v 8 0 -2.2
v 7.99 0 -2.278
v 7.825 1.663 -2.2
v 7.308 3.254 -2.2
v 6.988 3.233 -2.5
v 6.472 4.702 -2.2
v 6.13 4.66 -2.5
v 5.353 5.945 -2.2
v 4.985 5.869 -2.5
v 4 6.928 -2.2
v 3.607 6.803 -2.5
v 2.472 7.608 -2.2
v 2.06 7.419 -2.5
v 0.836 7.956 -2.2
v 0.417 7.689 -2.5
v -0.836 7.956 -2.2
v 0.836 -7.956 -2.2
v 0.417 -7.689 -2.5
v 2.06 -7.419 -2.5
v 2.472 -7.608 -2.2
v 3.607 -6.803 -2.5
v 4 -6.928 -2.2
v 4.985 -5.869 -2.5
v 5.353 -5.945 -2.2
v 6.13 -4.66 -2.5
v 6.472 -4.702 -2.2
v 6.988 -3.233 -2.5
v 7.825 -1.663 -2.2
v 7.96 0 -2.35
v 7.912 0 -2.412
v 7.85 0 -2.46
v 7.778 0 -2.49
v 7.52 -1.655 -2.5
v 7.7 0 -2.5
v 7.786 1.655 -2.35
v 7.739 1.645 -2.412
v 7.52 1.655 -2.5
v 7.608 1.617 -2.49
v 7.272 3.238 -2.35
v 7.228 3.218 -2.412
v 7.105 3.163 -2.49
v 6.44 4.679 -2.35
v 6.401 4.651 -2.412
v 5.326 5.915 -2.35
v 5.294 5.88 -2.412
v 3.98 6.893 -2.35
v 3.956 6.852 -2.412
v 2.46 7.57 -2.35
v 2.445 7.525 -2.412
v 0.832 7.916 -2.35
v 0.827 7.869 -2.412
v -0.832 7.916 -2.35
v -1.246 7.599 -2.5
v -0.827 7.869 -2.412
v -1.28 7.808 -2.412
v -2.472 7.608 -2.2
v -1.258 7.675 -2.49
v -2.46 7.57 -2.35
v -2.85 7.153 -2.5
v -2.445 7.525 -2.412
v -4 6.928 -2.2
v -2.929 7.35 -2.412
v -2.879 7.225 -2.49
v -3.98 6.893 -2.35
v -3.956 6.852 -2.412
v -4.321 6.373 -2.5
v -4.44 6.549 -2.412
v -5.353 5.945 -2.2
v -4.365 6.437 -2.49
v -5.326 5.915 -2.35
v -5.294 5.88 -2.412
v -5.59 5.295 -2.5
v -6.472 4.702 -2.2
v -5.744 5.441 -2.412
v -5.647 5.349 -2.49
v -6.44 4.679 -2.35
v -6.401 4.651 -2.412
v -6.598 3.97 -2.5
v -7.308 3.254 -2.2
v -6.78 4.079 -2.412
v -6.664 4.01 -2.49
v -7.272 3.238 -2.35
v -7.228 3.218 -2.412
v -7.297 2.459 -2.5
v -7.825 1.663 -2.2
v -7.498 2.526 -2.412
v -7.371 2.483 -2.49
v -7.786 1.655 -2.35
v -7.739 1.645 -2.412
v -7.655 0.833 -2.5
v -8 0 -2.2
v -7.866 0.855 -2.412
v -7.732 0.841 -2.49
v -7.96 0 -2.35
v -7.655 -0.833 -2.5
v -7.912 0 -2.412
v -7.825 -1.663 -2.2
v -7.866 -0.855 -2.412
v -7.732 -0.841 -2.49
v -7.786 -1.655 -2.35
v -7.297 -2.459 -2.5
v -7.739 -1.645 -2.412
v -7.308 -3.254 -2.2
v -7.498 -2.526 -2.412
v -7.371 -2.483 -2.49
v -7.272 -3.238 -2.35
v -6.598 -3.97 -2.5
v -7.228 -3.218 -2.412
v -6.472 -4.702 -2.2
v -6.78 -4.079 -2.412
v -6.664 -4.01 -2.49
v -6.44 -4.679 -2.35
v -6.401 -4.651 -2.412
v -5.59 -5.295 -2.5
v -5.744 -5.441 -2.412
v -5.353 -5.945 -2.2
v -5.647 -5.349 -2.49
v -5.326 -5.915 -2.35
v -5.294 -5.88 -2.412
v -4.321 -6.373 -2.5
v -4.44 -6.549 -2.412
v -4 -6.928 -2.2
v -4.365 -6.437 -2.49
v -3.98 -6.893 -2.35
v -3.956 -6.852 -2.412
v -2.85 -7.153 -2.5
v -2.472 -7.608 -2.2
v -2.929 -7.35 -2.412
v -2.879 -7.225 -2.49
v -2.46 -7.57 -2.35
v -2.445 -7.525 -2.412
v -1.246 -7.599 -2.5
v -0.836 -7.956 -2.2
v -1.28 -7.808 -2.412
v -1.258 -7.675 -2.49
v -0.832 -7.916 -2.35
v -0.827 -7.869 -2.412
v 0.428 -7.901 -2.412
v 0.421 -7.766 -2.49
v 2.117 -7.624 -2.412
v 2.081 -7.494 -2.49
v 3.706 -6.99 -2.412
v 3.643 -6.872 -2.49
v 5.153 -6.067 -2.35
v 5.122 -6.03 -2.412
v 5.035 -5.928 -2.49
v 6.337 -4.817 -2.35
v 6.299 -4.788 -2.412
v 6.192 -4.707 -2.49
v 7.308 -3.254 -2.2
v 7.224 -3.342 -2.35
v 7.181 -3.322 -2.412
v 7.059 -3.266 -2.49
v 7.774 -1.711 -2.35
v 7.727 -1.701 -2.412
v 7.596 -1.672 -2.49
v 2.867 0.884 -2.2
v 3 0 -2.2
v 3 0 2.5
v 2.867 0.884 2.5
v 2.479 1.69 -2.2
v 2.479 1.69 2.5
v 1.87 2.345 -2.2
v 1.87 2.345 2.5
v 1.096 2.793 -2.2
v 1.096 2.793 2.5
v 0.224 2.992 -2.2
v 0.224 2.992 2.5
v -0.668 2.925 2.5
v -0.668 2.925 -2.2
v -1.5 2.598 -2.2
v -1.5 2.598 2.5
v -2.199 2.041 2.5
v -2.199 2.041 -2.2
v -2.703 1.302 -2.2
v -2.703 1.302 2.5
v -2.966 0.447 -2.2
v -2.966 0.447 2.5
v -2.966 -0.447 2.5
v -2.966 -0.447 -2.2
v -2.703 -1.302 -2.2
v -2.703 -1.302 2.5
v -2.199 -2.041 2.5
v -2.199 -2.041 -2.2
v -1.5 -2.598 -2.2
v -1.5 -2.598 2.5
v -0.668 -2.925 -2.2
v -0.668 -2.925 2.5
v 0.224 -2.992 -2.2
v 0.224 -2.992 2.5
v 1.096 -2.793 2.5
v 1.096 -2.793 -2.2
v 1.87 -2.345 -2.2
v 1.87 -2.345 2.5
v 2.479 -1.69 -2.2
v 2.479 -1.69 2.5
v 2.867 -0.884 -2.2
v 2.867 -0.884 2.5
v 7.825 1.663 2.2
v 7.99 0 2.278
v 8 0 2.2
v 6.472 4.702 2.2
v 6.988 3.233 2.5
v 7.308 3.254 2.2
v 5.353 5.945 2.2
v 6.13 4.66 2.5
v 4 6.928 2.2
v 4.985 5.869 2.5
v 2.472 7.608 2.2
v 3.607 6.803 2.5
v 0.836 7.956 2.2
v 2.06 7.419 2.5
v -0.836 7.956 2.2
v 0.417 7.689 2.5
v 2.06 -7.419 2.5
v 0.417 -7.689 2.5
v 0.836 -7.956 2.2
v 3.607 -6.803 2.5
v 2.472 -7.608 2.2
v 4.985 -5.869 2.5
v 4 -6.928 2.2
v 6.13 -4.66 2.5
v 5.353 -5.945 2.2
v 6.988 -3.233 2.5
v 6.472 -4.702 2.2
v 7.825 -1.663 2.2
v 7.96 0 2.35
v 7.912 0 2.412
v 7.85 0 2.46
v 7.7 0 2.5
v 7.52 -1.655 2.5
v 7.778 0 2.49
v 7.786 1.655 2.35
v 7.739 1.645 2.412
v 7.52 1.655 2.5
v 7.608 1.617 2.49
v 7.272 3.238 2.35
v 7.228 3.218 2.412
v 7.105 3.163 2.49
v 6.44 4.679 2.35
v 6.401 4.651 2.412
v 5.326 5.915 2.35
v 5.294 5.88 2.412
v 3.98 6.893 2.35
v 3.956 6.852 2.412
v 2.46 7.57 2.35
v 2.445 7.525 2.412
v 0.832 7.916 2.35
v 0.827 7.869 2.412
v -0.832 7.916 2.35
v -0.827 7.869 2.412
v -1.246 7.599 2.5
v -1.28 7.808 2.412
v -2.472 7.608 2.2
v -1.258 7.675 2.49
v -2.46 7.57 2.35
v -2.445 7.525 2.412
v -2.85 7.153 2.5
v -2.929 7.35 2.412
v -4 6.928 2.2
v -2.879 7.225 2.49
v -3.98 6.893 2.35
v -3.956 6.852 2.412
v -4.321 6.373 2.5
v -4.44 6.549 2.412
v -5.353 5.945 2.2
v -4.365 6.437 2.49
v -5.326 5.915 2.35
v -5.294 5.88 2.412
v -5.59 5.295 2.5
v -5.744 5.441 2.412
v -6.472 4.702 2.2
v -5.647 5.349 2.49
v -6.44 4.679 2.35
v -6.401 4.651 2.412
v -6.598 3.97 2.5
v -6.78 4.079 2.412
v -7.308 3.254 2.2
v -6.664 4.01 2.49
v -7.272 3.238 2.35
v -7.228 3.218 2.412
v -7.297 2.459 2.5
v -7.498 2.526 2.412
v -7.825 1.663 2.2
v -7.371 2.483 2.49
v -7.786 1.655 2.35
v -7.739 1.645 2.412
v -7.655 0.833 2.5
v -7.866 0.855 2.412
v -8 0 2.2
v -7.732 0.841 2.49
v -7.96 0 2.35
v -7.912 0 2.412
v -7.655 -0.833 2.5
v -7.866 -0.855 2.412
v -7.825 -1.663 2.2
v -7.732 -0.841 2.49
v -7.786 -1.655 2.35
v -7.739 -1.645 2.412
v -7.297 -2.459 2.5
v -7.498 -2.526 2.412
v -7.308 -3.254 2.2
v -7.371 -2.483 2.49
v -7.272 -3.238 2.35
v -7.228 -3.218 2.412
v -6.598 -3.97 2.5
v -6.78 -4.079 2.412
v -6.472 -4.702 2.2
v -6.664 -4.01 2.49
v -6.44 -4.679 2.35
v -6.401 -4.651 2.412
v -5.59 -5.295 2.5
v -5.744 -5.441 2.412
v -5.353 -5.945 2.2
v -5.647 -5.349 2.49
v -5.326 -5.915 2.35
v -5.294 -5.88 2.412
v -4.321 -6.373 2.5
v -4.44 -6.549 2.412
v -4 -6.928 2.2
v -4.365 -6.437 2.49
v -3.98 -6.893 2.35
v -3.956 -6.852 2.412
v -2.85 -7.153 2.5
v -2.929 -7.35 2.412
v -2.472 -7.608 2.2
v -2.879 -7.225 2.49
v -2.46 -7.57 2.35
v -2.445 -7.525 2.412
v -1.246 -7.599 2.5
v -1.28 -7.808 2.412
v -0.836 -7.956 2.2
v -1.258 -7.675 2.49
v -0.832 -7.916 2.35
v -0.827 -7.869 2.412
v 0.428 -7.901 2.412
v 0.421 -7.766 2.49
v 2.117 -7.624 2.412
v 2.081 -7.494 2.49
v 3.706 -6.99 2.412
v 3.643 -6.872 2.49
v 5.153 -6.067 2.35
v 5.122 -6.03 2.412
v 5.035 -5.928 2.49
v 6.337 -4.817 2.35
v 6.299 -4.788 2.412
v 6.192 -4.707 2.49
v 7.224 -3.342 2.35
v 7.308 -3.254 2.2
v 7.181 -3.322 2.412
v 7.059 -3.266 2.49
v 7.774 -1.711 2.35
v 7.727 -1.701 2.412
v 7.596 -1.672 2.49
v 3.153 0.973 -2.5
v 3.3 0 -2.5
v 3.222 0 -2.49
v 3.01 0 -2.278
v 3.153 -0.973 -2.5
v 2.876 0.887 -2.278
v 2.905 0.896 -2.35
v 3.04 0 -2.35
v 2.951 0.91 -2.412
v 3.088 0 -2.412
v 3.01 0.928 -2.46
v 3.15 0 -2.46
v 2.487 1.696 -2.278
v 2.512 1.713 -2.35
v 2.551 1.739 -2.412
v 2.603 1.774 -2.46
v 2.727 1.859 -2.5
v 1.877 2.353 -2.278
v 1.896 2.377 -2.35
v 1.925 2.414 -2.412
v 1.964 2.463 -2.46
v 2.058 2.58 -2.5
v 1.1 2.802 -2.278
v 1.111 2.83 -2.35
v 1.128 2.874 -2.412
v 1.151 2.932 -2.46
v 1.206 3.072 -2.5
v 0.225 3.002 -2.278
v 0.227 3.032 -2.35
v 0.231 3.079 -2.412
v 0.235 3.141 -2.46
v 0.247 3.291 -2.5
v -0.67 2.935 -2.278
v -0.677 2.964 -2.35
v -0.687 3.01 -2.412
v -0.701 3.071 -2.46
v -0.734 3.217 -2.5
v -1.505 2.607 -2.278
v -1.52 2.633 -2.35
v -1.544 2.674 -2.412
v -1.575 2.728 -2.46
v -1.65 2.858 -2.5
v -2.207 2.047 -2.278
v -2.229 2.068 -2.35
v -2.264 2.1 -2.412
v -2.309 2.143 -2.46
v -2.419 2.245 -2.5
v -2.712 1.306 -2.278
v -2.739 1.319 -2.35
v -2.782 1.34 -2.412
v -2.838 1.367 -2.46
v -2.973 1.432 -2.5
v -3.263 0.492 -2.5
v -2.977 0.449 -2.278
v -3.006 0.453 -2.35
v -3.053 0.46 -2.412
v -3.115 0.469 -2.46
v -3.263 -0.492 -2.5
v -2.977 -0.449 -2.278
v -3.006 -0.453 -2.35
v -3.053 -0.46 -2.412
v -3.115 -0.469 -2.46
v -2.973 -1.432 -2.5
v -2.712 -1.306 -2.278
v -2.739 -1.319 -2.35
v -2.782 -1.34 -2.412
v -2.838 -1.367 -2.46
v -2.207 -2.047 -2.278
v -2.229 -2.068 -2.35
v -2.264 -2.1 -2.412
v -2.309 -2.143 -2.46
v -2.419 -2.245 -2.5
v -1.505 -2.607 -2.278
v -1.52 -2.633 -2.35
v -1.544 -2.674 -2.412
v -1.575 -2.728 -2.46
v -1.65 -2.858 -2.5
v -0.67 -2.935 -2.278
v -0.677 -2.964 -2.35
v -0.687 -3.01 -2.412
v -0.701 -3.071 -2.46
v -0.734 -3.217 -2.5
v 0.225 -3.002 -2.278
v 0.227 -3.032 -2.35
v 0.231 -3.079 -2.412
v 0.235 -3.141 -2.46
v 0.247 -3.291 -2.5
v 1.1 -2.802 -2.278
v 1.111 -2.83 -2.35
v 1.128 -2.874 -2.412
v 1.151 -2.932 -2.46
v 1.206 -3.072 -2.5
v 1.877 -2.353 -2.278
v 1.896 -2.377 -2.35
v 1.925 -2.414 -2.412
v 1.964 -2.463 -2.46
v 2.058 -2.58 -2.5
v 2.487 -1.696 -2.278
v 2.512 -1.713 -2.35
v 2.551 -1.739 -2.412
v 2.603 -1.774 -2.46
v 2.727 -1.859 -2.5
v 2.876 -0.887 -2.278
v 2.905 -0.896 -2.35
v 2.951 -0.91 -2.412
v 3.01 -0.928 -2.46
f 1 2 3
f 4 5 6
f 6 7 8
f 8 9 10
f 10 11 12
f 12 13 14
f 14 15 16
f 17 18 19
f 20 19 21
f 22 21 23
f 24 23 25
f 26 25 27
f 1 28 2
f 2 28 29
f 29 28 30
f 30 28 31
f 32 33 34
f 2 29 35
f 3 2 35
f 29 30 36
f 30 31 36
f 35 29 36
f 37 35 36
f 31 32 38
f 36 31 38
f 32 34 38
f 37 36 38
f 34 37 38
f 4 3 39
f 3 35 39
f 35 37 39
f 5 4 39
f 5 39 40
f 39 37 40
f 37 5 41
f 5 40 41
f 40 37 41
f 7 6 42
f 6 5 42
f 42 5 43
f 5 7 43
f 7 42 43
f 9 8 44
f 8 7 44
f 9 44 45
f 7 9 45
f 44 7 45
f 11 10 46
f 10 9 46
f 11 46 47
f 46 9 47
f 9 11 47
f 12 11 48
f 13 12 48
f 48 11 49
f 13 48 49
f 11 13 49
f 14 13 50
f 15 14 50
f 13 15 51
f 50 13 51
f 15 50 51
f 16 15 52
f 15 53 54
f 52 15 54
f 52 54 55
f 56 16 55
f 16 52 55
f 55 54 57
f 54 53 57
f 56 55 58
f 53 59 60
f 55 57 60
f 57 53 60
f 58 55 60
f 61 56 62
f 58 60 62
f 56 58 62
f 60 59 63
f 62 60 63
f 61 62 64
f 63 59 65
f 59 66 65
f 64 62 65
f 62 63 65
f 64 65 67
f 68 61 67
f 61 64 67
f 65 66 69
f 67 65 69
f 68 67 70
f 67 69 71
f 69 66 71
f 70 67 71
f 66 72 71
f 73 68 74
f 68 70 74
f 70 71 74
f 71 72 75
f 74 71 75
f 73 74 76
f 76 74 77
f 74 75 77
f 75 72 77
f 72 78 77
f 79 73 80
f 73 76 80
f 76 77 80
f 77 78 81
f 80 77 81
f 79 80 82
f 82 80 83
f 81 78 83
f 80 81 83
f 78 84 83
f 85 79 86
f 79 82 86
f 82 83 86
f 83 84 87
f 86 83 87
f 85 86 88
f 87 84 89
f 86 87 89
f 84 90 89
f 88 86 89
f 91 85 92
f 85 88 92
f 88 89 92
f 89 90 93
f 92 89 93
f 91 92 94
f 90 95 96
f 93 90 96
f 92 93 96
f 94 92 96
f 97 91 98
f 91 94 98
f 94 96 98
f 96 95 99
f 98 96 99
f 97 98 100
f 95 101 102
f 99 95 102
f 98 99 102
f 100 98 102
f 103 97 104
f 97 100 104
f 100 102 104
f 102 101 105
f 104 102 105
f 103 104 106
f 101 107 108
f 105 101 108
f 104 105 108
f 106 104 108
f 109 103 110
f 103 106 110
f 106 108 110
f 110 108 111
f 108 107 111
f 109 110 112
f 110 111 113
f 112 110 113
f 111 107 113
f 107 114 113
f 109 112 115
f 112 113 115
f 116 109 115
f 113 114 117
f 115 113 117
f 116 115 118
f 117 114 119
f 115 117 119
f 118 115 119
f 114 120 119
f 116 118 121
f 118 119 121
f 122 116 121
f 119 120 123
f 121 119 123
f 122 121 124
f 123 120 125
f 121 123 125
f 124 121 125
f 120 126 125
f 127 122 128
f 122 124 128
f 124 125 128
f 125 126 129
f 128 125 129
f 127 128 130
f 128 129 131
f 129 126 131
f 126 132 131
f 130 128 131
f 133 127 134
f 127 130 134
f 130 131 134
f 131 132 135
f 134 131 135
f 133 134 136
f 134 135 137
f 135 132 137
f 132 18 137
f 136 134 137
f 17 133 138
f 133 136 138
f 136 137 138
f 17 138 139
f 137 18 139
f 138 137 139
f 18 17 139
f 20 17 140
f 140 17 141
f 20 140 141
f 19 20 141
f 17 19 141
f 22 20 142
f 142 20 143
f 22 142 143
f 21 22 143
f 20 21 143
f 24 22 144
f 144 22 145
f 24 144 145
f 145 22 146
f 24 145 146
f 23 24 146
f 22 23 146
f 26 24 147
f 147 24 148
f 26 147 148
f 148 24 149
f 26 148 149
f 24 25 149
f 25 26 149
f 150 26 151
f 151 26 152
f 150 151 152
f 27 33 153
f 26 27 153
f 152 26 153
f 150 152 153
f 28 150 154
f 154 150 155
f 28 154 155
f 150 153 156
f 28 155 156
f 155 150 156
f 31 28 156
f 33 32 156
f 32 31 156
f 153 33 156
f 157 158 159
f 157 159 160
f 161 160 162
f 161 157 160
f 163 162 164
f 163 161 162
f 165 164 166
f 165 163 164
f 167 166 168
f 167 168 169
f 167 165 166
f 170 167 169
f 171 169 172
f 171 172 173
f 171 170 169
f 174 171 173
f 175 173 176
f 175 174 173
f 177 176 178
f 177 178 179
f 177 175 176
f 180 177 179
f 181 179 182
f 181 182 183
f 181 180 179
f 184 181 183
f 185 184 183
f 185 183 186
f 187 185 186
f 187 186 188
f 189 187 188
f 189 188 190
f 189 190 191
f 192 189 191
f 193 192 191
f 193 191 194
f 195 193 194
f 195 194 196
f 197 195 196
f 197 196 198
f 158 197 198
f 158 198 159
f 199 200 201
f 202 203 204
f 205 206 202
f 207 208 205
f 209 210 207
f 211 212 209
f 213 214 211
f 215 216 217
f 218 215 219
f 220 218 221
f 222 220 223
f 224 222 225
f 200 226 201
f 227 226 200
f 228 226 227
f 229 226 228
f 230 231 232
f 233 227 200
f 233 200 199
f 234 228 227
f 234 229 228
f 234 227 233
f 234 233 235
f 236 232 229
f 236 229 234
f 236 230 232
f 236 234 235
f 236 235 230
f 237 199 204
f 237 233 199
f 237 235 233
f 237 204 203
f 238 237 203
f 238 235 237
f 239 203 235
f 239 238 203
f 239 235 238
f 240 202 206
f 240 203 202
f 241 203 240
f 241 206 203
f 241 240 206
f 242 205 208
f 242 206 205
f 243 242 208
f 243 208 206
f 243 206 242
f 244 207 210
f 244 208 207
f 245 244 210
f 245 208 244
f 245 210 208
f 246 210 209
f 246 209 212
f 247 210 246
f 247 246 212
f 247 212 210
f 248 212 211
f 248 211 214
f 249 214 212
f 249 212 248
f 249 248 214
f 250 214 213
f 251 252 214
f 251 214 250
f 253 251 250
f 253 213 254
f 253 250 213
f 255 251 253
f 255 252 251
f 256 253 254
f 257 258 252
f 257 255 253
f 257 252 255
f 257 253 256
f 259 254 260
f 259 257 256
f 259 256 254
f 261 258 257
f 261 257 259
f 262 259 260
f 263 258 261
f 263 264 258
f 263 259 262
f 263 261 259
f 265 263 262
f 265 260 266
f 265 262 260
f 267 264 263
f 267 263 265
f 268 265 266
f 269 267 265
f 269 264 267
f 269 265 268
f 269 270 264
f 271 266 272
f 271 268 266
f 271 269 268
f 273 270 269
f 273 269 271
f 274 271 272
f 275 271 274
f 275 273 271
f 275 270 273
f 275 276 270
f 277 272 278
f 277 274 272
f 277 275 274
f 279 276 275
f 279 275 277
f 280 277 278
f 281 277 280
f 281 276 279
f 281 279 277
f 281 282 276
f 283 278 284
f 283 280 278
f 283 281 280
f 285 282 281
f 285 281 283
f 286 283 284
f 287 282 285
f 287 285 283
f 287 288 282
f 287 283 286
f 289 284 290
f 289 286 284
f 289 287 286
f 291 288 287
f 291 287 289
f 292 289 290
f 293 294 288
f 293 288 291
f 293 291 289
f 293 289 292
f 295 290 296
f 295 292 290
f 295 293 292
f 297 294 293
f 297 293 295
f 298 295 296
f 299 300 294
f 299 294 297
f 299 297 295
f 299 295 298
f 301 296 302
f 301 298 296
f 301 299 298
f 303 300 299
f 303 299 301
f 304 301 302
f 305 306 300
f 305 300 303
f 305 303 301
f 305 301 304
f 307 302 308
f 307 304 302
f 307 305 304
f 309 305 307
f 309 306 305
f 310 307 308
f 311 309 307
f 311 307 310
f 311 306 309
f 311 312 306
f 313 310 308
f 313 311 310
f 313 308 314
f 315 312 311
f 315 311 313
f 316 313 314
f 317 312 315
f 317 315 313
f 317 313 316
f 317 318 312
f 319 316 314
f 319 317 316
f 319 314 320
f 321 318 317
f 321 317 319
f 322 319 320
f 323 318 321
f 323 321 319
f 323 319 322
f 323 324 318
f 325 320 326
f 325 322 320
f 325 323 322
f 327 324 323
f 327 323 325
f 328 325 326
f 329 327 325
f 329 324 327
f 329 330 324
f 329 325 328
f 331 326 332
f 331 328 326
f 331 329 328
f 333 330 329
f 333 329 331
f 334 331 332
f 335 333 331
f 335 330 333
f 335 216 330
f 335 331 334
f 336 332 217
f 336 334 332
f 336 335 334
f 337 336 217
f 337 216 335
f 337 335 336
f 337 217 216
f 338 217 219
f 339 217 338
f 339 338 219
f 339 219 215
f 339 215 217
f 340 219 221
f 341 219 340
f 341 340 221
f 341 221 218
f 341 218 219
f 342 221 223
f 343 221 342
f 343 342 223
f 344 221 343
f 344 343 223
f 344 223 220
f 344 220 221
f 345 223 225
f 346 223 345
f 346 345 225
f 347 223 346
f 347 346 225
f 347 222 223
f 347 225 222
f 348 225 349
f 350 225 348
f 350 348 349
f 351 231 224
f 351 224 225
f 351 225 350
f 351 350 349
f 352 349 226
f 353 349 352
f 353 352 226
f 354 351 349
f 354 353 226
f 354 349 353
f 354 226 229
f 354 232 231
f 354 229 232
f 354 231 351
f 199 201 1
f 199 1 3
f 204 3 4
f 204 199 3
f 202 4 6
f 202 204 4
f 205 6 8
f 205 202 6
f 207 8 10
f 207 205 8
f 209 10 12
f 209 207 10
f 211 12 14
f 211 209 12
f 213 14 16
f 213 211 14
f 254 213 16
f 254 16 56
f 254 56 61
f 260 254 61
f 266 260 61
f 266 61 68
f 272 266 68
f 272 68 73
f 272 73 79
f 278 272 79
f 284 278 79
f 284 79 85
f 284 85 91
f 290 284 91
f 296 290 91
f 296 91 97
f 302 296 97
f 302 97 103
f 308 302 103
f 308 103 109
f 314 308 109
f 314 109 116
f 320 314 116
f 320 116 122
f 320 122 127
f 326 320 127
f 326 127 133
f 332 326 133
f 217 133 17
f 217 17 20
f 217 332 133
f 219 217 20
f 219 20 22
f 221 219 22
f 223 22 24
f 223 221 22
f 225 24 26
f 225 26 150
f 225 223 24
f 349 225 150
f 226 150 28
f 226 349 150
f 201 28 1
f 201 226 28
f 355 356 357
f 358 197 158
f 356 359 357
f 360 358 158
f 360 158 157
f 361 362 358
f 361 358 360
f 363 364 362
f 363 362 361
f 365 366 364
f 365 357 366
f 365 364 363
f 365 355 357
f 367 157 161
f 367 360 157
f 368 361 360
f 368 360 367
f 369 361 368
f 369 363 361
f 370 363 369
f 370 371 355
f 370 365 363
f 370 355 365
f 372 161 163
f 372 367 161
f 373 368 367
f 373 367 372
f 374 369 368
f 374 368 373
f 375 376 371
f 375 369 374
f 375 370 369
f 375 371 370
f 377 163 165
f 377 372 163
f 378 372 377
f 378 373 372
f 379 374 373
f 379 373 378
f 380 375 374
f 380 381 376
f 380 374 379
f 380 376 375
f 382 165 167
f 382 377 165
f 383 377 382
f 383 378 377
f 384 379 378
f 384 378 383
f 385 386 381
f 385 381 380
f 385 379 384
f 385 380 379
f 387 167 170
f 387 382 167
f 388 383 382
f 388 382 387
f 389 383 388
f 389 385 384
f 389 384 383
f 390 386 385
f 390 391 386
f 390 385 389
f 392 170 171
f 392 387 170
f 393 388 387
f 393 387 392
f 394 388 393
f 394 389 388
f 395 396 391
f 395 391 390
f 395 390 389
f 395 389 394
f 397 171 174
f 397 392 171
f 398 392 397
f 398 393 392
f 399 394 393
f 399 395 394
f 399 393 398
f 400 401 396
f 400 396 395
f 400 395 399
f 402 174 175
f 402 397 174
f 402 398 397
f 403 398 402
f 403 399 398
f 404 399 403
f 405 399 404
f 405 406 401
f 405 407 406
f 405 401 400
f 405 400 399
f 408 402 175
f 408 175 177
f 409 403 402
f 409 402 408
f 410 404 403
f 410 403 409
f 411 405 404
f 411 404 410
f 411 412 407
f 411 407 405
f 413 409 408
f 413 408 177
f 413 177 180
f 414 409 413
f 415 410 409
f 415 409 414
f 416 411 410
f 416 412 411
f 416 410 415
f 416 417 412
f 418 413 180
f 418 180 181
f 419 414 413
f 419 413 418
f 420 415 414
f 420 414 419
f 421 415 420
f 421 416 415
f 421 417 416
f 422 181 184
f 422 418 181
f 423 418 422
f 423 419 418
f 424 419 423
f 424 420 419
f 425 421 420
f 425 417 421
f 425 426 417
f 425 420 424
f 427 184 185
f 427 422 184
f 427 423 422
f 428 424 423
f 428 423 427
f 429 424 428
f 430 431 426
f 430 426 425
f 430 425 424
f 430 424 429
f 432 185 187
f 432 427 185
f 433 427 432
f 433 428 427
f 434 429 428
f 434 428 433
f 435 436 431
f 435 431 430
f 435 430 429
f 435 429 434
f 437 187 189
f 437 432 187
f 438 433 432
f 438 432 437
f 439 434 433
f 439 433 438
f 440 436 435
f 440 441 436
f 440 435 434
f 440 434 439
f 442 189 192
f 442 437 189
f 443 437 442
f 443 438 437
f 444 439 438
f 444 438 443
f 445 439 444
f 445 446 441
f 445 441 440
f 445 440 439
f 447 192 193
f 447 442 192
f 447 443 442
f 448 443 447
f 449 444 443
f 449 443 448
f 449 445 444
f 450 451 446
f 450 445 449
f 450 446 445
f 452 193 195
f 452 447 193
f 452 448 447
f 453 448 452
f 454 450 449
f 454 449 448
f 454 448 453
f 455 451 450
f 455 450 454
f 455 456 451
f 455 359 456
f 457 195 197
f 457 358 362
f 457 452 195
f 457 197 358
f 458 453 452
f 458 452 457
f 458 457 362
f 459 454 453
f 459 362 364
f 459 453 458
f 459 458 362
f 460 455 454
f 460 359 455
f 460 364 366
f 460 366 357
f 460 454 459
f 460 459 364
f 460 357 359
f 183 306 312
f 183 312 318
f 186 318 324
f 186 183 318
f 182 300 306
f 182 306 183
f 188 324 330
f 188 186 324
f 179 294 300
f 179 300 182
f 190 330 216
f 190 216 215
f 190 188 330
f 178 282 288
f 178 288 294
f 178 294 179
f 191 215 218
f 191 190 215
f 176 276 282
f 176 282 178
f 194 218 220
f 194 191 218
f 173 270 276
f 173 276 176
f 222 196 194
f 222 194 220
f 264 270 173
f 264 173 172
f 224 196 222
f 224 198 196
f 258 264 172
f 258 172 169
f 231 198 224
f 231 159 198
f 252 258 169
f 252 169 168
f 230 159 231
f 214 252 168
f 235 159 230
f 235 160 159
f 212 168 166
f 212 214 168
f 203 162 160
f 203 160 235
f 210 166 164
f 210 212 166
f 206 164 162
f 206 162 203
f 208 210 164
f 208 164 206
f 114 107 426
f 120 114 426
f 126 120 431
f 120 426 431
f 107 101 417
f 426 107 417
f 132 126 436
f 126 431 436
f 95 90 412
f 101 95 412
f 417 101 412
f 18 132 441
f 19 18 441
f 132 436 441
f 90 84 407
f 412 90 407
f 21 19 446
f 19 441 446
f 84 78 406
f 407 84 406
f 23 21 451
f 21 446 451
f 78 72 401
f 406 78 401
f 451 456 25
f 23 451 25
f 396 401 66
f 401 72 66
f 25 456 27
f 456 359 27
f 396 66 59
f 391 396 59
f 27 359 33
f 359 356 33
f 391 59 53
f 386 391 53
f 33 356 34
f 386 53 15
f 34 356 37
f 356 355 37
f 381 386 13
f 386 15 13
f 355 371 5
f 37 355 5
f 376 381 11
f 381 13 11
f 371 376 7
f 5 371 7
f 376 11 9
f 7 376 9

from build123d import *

# Parameters (mm, degrees)
SKETCH1_R           = 8
SKETCH1_R_2         = 3
BOSS_EXTRUDE1_DEPTH = 2.5
FILLET2_R           = 0.3


with BuildPart() as part:
    # Sketch1 → Boss-Extrude1 (new, symmetric)
    with BuildSketch(Plane.XY):
        Circle(SKETCH1_R)
        Circle(SKETCH1_R_2, mode=Mode.SUBTRACT)
    extrude(amount=BOSS_EXTRUDE1_DEPTH, both=True)

    # Fillet2
    fillet2_edges = [part.edges().sort_by_distance(p)[0] for p in [
        (-8, 0, -2.5),
        (-8, 0, 2.5),
        (-3, 0, -2.5),
    ]]
    fillet(fillet2_edges, radius=FILLET2_R)


solid = part.part
